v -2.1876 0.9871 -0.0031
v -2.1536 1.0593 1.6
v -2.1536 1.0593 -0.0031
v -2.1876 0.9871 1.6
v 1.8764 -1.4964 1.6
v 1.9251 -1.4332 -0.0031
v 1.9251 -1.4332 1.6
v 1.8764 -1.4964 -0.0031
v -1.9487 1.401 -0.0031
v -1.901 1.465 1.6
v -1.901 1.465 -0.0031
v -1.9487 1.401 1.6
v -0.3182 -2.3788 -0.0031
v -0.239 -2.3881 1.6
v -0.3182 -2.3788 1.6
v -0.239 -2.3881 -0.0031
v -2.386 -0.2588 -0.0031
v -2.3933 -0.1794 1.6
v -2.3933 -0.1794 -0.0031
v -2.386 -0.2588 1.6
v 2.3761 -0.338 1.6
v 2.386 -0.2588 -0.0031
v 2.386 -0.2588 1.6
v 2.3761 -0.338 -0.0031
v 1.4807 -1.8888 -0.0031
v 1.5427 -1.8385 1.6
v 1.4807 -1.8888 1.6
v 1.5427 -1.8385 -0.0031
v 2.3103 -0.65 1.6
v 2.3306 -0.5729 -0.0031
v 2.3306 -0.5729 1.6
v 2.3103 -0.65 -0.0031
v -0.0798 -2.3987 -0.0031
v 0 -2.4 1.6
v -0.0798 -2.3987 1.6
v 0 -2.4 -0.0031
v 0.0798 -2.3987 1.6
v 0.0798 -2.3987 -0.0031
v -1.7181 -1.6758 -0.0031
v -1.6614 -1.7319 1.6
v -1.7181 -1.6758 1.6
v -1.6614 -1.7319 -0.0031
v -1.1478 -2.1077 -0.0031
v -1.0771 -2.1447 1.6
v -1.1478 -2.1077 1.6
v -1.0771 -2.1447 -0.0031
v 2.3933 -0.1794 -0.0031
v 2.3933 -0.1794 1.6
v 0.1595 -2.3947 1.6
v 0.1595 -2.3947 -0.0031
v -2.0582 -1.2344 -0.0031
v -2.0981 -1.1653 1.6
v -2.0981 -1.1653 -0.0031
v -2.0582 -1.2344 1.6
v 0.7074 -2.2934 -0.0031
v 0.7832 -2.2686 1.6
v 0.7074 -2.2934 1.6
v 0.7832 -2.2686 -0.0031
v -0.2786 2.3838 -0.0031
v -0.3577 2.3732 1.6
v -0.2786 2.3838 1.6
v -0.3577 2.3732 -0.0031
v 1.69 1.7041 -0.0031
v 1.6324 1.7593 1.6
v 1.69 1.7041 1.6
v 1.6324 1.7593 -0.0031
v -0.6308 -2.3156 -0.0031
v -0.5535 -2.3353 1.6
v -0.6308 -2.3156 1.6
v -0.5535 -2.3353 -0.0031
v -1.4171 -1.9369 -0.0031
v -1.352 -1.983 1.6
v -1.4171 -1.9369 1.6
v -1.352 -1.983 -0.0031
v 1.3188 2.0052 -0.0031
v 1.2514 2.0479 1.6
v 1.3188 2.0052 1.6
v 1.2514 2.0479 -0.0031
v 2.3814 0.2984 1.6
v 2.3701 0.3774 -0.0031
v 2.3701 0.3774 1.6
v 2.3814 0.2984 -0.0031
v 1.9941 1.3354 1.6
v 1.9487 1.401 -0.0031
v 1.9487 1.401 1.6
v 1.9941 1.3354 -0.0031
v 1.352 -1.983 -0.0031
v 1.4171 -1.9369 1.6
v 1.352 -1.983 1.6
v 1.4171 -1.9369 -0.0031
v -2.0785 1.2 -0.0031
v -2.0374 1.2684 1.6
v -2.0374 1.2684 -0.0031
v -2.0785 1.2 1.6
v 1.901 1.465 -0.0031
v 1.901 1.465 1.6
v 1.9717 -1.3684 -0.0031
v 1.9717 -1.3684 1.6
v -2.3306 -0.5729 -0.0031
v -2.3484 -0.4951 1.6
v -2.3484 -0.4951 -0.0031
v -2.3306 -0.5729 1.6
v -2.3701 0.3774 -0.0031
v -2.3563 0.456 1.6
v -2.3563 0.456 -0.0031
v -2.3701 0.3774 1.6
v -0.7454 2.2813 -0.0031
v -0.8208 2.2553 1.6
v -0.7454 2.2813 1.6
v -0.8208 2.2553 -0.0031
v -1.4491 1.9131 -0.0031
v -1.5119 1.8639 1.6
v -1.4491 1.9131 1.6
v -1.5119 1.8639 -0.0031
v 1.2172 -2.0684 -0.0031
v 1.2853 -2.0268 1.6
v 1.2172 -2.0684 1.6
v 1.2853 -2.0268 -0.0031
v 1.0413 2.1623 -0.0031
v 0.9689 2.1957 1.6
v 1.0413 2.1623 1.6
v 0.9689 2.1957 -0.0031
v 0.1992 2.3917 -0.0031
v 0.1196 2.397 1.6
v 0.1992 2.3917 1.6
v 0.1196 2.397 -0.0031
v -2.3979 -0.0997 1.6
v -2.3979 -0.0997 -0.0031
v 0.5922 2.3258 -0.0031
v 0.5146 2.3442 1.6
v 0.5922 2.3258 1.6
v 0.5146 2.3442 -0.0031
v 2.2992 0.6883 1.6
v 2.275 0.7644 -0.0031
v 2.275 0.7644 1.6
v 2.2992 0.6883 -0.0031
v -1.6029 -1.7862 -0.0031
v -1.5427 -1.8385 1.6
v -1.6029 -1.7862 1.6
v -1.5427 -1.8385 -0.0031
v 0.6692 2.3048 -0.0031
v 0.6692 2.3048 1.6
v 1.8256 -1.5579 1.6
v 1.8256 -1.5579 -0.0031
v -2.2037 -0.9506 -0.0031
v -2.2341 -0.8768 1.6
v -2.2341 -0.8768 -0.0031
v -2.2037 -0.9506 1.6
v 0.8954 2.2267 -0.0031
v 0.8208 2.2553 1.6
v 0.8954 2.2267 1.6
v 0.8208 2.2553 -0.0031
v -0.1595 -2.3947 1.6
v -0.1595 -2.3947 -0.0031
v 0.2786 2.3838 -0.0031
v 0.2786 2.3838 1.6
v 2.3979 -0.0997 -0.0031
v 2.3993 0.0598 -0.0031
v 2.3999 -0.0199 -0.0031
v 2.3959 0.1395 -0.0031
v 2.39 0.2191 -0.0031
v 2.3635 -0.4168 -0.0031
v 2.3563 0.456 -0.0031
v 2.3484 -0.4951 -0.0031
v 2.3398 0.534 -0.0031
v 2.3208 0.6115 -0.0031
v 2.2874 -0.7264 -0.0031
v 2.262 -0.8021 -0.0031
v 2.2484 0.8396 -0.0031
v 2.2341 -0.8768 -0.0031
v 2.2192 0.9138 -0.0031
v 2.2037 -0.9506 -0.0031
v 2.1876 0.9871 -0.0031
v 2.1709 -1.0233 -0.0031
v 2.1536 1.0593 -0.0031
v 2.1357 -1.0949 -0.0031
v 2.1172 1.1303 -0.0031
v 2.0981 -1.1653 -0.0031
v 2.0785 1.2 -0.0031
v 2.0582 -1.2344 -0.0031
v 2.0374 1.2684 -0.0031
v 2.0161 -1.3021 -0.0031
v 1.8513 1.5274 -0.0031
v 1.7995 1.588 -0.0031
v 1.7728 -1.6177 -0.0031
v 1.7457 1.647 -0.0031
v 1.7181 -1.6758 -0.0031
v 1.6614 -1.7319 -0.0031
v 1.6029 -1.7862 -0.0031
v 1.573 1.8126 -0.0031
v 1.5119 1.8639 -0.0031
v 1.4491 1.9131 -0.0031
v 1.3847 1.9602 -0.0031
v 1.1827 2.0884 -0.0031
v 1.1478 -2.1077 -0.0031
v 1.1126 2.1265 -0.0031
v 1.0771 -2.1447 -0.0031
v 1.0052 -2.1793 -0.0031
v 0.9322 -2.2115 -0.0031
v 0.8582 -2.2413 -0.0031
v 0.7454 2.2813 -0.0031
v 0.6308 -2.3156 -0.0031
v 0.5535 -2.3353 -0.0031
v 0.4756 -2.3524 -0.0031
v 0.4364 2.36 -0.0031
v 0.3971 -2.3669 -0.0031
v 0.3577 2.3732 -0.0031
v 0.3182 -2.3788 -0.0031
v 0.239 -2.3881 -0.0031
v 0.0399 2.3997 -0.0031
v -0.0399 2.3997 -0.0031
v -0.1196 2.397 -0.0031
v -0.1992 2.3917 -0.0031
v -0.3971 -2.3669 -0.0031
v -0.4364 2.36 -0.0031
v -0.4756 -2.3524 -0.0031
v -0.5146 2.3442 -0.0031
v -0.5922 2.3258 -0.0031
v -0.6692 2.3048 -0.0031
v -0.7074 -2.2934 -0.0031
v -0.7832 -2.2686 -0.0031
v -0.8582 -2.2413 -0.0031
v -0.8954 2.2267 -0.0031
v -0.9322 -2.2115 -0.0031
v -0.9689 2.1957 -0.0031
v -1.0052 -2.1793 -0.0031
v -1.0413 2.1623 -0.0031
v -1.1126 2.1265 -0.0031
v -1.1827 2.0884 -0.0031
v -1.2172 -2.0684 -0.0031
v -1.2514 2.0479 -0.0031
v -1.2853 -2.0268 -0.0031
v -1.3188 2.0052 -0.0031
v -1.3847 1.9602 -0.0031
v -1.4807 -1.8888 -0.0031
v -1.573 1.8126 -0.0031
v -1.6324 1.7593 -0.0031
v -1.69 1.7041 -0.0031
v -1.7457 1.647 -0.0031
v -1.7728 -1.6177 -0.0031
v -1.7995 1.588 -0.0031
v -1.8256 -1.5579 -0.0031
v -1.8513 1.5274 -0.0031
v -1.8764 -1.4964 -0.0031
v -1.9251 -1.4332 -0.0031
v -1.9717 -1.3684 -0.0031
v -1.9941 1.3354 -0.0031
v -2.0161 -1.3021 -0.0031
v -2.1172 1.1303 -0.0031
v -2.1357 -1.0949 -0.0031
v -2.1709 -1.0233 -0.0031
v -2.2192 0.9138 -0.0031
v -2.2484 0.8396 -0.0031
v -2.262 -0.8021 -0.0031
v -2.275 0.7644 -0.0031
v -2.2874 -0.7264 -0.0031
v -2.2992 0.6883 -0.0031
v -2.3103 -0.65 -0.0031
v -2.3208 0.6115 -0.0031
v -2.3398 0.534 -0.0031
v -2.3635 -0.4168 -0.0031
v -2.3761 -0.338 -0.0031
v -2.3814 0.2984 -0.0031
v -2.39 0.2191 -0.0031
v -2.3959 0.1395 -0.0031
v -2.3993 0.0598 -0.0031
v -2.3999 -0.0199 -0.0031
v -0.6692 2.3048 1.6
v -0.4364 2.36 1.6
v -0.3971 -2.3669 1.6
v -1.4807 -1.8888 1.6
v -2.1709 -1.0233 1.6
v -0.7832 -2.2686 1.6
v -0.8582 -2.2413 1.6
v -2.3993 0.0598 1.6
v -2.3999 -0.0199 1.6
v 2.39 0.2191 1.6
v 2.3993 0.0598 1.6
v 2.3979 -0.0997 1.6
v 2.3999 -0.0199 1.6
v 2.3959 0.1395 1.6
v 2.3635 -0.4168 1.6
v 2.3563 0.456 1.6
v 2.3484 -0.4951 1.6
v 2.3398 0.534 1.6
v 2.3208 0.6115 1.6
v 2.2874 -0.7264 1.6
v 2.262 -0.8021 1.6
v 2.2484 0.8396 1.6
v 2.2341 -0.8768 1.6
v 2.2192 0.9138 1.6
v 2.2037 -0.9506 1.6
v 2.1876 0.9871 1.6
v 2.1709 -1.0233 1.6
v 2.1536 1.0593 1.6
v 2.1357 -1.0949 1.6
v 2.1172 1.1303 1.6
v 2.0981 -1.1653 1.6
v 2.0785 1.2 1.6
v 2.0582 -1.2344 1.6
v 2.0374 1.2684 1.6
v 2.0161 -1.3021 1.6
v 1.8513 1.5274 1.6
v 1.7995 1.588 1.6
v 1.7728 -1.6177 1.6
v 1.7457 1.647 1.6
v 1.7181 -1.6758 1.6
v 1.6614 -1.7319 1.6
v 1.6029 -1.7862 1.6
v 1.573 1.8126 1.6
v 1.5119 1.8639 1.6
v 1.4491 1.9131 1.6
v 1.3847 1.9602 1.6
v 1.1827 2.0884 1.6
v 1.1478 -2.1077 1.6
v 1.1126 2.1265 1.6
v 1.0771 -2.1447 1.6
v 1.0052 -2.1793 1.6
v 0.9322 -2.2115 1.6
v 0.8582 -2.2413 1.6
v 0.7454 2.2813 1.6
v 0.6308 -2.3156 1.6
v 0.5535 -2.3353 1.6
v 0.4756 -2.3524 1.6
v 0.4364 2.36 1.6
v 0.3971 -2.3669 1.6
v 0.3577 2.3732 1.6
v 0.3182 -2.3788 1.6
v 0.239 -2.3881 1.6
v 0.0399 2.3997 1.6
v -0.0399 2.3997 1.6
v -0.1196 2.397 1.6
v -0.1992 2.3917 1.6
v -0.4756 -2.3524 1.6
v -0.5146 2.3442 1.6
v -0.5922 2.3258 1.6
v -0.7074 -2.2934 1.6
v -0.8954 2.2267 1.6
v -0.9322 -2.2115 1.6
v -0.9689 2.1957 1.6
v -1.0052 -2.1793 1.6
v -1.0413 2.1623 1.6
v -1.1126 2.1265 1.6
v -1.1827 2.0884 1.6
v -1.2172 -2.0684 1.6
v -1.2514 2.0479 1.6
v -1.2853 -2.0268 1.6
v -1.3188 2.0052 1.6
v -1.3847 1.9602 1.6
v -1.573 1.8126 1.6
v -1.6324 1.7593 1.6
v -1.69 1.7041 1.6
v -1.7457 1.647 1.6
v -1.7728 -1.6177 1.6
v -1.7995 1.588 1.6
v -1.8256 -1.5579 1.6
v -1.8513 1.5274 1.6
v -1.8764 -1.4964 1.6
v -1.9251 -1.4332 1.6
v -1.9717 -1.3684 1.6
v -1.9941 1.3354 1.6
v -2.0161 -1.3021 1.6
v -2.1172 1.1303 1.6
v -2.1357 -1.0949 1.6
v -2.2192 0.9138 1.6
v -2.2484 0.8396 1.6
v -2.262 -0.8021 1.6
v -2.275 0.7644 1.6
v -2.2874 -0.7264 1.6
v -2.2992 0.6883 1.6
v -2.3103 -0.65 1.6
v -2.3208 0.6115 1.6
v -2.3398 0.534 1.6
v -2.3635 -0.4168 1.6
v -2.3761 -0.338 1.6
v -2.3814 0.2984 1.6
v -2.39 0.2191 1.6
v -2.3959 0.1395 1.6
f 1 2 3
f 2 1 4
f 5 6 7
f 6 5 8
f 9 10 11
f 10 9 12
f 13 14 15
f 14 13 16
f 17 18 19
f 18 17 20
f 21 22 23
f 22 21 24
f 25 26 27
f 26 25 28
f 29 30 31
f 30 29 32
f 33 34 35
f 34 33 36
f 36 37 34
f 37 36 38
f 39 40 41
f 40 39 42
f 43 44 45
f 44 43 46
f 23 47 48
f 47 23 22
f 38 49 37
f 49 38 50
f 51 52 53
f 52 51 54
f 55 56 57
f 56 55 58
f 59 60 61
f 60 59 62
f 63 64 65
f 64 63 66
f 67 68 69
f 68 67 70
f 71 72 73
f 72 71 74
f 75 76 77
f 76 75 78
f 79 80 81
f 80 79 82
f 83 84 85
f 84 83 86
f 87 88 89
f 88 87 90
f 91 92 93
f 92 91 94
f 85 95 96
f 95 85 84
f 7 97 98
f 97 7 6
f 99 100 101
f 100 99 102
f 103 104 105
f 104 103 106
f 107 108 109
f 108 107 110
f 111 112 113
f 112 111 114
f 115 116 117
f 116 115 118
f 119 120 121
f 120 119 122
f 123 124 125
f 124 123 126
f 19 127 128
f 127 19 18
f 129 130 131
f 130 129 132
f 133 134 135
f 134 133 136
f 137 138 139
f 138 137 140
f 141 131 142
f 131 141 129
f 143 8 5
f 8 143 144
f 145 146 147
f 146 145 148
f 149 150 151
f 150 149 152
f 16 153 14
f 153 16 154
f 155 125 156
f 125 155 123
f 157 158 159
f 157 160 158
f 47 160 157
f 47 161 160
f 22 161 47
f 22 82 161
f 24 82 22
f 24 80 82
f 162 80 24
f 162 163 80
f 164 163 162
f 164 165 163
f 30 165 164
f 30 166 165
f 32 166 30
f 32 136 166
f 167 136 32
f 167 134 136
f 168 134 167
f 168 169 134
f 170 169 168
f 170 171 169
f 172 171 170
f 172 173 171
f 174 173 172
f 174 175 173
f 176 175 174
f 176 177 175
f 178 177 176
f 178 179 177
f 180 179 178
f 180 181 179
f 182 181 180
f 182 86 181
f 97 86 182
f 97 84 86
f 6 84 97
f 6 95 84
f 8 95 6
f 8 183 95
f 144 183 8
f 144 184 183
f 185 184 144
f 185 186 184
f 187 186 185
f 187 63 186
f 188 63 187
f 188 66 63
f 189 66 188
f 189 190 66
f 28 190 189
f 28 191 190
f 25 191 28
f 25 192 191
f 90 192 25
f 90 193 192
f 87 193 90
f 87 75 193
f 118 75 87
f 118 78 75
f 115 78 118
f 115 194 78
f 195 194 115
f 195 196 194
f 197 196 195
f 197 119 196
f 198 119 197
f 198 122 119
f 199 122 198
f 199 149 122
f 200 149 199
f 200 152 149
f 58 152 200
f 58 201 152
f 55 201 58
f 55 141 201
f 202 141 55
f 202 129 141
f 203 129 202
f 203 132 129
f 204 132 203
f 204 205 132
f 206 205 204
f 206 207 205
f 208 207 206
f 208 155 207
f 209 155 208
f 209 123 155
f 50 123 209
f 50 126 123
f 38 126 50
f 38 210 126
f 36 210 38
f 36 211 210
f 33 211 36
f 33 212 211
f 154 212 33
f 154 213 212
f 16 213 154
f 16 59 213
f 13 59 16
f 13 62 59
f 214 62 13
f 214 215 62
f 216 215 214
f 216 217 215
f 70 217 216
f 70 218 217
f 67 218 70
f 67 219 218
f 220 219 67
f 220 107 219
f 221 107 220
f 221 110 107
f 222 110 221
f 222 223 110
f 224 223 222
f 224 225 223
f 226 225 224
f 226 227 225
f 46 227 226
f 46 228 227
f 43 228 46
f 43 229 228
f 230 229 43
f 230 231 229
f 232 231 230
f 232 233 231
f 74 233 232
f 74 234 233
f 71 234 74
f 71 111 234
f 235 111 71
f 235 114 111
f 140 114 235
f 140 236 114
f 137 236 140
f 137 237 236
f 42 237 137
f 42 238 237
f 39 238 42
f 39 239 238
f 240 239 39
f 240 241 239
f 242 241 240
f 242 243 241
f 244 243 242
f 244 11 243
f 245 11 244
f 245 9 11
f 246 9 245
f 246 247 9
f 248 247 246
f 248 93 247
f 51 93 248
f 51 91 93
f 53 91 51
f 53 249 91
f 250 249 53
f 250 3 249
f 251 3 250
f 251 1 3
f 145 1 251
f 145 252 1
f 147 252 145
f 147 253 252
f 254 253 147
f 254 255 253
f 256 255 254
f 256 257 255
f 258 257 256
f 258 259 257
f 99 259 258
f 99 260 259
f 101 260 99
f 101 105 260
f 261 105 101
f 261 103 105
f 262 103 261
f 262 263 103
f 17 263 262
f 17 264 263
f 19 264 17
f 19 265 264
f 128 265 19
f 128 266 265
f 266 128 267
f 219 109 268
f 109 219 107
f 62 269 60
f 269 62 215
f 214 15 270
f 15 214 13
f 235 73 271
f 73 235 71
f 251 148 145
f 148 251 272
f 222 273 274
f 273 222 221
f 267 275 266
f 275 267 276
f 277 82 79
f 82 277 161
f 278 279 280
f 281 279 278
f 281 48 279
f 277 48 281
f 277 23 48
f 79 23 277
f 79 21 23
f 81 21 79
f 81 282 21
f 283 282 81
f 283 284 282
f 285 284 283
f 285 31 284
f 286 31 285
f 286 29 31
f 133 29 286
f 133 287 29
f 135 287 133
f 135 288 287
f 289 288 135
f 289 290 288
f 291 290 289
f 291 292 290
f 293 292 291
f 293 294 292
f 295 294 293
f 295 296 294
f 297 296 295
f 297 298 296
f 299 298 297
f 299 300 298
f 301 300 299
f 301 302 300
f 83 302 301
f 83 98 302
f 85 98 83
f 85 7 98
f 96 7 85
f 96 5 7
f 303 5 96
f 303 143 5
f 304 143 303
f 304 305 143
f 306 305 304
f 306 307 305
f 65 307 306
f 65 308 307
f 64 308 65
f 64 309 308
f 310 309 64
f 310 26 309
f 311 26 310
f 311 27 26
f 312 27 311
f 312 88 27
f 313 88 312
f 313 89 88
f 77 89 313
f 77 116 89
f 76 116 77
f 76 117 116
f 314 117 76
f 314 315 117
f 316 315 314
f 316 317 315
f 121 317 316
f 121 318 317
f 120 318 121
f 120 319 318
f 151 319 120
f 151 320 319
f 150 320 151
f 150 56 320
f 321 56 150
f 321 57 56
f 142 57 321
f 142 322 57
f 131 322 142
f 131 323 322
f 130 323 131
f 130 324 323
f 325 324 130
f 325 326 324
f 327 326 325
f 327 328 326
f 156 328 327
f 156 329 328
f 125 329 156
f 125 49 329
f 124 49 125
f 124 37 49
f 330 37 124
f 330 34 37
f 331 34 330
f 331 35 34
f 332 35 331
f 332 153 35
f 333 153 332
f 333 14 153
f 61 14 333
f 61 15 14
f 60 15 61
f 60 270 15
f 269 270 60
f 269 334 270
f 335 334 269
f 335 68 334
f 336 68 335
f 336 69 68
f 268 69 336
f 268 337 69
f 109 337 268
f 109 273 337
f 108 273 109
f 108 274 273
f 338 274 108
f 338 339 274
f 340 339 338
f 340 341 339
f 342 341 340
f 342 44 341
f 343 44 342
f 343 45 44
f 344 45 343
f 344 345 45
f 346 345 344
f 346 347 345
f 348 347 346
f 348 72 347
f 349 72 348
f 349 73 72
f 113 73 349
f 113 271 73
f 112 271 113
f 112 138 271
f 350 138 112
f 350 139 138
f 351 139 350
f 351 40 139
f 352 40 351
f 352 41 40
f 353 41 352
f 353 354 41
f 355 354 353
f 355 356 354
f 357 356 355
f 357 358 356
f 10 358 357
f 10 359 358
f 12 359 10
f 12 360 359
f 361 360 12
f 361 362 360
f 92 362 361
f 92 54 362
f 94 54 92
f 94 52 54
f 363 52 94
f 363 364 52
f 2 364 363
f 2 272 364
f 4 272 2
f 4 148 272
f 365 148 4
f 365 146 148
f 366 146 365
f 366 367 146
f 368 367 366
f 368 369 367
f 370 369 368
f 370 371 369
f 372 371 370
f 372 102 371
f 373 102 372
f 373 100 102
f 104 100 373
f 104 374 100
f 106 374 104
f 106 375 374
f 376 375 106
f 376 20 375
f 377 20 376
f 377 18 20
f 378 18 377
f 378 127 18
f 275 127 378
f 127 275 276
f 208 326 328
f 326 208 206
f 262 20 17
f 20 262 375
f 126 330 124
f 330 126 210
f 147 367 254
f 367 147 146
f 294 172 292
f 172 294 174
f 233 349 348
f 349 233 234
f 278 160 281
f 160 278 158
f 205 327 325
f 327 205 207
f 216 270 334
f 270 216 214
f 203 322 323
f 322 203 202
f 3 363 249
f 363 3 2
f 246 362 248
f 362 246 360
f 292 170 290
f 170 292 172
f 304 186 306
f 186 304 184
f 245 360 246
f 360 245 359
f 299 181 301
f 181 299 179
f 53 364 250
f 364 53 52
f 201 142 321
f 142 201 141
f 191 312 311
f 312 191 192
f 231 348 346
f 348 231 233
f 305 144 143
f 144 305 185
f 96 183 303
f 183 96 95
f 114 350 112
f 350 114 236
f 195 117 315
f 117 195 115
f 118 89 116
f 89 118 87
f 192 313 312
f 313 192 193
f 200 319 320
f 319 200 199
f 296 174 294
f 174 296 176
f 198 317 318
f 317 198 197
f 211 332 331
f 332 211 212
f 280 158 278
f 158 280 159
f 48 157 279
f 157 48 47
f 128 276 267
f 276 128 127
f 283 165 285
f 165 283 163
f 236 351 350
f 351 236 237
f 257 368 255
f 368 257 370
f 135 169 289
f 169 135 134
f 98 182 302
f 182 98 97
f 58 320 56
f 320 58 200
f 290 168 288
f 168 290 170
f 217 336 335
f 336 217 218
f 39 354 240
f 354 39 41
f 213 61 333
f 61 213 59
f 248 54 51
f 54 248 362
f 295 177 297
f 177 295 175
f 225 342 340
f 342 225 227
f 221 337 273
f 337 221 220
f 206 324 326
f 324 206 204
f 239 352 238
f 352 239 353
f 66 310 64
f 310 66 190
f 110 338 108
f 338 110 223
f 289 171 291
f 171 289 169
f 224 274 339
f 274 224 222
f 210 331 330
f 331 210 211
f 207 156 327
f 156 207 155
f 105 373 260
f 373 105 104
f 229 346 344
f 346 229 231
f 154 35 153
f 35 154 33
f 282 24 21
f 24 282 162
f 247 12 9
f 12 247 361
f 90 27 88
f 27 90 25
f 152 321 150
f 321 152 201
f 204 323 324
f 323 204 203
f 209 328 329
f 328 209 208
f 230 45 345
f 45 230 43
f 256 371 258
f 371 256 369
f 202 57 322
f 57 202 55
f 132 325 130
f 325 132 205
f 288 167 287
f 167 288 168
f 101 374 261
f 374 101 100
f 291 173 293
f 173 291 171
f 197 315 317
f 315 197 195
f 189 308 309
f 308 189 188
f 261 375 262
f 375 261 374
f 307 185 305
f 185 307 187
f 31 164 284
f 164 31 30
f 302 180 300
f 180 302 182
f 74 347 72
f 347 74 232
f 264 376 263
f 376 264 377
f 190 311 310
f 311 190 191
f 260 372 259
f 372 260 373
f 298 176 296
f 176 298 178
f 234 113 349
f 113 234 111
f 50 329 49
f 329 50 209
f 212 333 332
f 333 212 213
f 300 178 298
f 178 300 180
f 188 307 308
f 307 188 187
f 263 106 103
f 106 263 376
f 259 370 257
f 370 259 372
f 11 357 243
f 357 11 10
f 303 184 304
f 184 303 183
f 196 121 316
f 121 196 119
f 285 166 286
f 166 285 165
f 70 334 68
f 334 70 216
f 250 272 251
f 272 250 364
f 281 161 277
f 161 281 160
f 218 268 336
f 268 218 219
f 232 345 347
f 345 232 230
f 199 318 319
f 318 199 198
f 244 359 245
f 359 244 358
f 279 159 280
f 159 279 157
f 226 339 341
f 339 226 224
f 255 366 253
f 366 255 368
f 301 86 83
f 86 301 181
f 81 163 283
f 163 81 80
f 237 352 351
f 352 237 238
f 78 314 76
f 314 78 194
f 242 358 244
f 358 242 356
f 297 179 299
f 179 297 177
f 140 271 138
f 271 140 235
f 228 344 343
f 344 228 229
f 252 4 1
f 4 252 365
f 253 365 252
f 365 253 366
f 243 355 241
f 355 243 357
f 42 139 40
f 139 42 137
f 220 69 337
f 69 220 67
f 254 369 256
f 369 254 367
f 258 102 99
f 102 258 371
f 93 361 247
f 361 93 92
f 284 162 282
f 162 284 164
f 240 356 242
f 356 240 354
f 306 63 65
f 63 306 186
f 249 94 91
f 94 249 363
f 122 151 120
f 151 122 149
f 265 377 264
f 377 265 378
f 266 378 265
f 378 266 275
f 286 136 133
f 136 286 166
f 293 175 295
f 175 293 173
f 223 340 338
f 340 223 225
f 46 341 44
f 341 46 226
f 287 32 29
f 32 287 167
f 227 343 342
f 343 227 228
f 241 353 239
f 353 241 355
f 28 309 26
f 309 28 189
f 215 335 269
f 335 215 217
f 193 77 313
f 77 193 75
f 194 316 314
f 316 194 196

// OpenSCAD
use <../lib.scad>
use <s/3960pb9s01.scad>
use <s/3960s01.scad>
use <s/3960s05.scad>
$fa=1; $fs=0.2;
function ldraw_lib__3960pb9(realsolid=false) = [
// 0 Dish  4 x  4 Inverted with Five Orange Wedges Pattern
// 0 Name: 3960pb9.dat
// 0 Author: Gerald Lasser [GeraldLasser]
// 0 !LDRAW_ORG Part UPDATE 2020-01
// 0 !LICENSE Licensed under CC BY 2.0 and CC BY 4.0 : see CAreadme.txt
// 
// 0 BFC CERTIFY CCW
  [0,"BFC","CERTIFY"],
  [0,"BFC","CCW"],
// 
// 0 !KEYWORDS Bricklink 3960pb053, Set 10761
// 
// 0 !CMDLINE -c191
// 
// 0 !HISTORY 2020-06-28 [PTadmin] Official Update 2020-01
// 
// 
// 1 16 0 0 0 1 0 0 0 1 0 0 0 1 s\3960s01.dat
  [1,16,0,0,0,1,0,0,0,1,0,0,0,1, ldraw_lib__s__3960s01(realsolid)],
// 
// 1 16 0 0 0 1 0 0 0 1 0 0 0 1 s\3960pb9s01.dat
  [1,16,0,0,0,1,0,0,0,1,0,0,0,1, ldraw_lib__s__3960pb9s01(realsolid)],
// 1 16 0 0 0 -1 0 0 0 1 0 0 0 1 s\3960pb9s01.dat
  [1,16,0,0,0,-1,0,0,0,1,0,0,0,1, ldraw_lib__s__3960pb9s01(realsolid)],
// 
// 1 16 0 0 0 1 0 0 0 1 0 0 0 1 s\3960s05.dat
  [1,16,0,0,0,1,0,0,0,1,0,0,0,1, ldraw_lib__s__3960s05(realsolid)],
];
module ldraw_lib__3960pb9(step=0, col=false, unit=2/5, alt=false, line=0.2, solid=!$preview)
    makepoly(ldraw_lib__3960pb9(solid), step=step, col=col, unit=unit, alt=alt, line=line, solid=solid);
ldraw_lib__3960pb9(line=0.2);
